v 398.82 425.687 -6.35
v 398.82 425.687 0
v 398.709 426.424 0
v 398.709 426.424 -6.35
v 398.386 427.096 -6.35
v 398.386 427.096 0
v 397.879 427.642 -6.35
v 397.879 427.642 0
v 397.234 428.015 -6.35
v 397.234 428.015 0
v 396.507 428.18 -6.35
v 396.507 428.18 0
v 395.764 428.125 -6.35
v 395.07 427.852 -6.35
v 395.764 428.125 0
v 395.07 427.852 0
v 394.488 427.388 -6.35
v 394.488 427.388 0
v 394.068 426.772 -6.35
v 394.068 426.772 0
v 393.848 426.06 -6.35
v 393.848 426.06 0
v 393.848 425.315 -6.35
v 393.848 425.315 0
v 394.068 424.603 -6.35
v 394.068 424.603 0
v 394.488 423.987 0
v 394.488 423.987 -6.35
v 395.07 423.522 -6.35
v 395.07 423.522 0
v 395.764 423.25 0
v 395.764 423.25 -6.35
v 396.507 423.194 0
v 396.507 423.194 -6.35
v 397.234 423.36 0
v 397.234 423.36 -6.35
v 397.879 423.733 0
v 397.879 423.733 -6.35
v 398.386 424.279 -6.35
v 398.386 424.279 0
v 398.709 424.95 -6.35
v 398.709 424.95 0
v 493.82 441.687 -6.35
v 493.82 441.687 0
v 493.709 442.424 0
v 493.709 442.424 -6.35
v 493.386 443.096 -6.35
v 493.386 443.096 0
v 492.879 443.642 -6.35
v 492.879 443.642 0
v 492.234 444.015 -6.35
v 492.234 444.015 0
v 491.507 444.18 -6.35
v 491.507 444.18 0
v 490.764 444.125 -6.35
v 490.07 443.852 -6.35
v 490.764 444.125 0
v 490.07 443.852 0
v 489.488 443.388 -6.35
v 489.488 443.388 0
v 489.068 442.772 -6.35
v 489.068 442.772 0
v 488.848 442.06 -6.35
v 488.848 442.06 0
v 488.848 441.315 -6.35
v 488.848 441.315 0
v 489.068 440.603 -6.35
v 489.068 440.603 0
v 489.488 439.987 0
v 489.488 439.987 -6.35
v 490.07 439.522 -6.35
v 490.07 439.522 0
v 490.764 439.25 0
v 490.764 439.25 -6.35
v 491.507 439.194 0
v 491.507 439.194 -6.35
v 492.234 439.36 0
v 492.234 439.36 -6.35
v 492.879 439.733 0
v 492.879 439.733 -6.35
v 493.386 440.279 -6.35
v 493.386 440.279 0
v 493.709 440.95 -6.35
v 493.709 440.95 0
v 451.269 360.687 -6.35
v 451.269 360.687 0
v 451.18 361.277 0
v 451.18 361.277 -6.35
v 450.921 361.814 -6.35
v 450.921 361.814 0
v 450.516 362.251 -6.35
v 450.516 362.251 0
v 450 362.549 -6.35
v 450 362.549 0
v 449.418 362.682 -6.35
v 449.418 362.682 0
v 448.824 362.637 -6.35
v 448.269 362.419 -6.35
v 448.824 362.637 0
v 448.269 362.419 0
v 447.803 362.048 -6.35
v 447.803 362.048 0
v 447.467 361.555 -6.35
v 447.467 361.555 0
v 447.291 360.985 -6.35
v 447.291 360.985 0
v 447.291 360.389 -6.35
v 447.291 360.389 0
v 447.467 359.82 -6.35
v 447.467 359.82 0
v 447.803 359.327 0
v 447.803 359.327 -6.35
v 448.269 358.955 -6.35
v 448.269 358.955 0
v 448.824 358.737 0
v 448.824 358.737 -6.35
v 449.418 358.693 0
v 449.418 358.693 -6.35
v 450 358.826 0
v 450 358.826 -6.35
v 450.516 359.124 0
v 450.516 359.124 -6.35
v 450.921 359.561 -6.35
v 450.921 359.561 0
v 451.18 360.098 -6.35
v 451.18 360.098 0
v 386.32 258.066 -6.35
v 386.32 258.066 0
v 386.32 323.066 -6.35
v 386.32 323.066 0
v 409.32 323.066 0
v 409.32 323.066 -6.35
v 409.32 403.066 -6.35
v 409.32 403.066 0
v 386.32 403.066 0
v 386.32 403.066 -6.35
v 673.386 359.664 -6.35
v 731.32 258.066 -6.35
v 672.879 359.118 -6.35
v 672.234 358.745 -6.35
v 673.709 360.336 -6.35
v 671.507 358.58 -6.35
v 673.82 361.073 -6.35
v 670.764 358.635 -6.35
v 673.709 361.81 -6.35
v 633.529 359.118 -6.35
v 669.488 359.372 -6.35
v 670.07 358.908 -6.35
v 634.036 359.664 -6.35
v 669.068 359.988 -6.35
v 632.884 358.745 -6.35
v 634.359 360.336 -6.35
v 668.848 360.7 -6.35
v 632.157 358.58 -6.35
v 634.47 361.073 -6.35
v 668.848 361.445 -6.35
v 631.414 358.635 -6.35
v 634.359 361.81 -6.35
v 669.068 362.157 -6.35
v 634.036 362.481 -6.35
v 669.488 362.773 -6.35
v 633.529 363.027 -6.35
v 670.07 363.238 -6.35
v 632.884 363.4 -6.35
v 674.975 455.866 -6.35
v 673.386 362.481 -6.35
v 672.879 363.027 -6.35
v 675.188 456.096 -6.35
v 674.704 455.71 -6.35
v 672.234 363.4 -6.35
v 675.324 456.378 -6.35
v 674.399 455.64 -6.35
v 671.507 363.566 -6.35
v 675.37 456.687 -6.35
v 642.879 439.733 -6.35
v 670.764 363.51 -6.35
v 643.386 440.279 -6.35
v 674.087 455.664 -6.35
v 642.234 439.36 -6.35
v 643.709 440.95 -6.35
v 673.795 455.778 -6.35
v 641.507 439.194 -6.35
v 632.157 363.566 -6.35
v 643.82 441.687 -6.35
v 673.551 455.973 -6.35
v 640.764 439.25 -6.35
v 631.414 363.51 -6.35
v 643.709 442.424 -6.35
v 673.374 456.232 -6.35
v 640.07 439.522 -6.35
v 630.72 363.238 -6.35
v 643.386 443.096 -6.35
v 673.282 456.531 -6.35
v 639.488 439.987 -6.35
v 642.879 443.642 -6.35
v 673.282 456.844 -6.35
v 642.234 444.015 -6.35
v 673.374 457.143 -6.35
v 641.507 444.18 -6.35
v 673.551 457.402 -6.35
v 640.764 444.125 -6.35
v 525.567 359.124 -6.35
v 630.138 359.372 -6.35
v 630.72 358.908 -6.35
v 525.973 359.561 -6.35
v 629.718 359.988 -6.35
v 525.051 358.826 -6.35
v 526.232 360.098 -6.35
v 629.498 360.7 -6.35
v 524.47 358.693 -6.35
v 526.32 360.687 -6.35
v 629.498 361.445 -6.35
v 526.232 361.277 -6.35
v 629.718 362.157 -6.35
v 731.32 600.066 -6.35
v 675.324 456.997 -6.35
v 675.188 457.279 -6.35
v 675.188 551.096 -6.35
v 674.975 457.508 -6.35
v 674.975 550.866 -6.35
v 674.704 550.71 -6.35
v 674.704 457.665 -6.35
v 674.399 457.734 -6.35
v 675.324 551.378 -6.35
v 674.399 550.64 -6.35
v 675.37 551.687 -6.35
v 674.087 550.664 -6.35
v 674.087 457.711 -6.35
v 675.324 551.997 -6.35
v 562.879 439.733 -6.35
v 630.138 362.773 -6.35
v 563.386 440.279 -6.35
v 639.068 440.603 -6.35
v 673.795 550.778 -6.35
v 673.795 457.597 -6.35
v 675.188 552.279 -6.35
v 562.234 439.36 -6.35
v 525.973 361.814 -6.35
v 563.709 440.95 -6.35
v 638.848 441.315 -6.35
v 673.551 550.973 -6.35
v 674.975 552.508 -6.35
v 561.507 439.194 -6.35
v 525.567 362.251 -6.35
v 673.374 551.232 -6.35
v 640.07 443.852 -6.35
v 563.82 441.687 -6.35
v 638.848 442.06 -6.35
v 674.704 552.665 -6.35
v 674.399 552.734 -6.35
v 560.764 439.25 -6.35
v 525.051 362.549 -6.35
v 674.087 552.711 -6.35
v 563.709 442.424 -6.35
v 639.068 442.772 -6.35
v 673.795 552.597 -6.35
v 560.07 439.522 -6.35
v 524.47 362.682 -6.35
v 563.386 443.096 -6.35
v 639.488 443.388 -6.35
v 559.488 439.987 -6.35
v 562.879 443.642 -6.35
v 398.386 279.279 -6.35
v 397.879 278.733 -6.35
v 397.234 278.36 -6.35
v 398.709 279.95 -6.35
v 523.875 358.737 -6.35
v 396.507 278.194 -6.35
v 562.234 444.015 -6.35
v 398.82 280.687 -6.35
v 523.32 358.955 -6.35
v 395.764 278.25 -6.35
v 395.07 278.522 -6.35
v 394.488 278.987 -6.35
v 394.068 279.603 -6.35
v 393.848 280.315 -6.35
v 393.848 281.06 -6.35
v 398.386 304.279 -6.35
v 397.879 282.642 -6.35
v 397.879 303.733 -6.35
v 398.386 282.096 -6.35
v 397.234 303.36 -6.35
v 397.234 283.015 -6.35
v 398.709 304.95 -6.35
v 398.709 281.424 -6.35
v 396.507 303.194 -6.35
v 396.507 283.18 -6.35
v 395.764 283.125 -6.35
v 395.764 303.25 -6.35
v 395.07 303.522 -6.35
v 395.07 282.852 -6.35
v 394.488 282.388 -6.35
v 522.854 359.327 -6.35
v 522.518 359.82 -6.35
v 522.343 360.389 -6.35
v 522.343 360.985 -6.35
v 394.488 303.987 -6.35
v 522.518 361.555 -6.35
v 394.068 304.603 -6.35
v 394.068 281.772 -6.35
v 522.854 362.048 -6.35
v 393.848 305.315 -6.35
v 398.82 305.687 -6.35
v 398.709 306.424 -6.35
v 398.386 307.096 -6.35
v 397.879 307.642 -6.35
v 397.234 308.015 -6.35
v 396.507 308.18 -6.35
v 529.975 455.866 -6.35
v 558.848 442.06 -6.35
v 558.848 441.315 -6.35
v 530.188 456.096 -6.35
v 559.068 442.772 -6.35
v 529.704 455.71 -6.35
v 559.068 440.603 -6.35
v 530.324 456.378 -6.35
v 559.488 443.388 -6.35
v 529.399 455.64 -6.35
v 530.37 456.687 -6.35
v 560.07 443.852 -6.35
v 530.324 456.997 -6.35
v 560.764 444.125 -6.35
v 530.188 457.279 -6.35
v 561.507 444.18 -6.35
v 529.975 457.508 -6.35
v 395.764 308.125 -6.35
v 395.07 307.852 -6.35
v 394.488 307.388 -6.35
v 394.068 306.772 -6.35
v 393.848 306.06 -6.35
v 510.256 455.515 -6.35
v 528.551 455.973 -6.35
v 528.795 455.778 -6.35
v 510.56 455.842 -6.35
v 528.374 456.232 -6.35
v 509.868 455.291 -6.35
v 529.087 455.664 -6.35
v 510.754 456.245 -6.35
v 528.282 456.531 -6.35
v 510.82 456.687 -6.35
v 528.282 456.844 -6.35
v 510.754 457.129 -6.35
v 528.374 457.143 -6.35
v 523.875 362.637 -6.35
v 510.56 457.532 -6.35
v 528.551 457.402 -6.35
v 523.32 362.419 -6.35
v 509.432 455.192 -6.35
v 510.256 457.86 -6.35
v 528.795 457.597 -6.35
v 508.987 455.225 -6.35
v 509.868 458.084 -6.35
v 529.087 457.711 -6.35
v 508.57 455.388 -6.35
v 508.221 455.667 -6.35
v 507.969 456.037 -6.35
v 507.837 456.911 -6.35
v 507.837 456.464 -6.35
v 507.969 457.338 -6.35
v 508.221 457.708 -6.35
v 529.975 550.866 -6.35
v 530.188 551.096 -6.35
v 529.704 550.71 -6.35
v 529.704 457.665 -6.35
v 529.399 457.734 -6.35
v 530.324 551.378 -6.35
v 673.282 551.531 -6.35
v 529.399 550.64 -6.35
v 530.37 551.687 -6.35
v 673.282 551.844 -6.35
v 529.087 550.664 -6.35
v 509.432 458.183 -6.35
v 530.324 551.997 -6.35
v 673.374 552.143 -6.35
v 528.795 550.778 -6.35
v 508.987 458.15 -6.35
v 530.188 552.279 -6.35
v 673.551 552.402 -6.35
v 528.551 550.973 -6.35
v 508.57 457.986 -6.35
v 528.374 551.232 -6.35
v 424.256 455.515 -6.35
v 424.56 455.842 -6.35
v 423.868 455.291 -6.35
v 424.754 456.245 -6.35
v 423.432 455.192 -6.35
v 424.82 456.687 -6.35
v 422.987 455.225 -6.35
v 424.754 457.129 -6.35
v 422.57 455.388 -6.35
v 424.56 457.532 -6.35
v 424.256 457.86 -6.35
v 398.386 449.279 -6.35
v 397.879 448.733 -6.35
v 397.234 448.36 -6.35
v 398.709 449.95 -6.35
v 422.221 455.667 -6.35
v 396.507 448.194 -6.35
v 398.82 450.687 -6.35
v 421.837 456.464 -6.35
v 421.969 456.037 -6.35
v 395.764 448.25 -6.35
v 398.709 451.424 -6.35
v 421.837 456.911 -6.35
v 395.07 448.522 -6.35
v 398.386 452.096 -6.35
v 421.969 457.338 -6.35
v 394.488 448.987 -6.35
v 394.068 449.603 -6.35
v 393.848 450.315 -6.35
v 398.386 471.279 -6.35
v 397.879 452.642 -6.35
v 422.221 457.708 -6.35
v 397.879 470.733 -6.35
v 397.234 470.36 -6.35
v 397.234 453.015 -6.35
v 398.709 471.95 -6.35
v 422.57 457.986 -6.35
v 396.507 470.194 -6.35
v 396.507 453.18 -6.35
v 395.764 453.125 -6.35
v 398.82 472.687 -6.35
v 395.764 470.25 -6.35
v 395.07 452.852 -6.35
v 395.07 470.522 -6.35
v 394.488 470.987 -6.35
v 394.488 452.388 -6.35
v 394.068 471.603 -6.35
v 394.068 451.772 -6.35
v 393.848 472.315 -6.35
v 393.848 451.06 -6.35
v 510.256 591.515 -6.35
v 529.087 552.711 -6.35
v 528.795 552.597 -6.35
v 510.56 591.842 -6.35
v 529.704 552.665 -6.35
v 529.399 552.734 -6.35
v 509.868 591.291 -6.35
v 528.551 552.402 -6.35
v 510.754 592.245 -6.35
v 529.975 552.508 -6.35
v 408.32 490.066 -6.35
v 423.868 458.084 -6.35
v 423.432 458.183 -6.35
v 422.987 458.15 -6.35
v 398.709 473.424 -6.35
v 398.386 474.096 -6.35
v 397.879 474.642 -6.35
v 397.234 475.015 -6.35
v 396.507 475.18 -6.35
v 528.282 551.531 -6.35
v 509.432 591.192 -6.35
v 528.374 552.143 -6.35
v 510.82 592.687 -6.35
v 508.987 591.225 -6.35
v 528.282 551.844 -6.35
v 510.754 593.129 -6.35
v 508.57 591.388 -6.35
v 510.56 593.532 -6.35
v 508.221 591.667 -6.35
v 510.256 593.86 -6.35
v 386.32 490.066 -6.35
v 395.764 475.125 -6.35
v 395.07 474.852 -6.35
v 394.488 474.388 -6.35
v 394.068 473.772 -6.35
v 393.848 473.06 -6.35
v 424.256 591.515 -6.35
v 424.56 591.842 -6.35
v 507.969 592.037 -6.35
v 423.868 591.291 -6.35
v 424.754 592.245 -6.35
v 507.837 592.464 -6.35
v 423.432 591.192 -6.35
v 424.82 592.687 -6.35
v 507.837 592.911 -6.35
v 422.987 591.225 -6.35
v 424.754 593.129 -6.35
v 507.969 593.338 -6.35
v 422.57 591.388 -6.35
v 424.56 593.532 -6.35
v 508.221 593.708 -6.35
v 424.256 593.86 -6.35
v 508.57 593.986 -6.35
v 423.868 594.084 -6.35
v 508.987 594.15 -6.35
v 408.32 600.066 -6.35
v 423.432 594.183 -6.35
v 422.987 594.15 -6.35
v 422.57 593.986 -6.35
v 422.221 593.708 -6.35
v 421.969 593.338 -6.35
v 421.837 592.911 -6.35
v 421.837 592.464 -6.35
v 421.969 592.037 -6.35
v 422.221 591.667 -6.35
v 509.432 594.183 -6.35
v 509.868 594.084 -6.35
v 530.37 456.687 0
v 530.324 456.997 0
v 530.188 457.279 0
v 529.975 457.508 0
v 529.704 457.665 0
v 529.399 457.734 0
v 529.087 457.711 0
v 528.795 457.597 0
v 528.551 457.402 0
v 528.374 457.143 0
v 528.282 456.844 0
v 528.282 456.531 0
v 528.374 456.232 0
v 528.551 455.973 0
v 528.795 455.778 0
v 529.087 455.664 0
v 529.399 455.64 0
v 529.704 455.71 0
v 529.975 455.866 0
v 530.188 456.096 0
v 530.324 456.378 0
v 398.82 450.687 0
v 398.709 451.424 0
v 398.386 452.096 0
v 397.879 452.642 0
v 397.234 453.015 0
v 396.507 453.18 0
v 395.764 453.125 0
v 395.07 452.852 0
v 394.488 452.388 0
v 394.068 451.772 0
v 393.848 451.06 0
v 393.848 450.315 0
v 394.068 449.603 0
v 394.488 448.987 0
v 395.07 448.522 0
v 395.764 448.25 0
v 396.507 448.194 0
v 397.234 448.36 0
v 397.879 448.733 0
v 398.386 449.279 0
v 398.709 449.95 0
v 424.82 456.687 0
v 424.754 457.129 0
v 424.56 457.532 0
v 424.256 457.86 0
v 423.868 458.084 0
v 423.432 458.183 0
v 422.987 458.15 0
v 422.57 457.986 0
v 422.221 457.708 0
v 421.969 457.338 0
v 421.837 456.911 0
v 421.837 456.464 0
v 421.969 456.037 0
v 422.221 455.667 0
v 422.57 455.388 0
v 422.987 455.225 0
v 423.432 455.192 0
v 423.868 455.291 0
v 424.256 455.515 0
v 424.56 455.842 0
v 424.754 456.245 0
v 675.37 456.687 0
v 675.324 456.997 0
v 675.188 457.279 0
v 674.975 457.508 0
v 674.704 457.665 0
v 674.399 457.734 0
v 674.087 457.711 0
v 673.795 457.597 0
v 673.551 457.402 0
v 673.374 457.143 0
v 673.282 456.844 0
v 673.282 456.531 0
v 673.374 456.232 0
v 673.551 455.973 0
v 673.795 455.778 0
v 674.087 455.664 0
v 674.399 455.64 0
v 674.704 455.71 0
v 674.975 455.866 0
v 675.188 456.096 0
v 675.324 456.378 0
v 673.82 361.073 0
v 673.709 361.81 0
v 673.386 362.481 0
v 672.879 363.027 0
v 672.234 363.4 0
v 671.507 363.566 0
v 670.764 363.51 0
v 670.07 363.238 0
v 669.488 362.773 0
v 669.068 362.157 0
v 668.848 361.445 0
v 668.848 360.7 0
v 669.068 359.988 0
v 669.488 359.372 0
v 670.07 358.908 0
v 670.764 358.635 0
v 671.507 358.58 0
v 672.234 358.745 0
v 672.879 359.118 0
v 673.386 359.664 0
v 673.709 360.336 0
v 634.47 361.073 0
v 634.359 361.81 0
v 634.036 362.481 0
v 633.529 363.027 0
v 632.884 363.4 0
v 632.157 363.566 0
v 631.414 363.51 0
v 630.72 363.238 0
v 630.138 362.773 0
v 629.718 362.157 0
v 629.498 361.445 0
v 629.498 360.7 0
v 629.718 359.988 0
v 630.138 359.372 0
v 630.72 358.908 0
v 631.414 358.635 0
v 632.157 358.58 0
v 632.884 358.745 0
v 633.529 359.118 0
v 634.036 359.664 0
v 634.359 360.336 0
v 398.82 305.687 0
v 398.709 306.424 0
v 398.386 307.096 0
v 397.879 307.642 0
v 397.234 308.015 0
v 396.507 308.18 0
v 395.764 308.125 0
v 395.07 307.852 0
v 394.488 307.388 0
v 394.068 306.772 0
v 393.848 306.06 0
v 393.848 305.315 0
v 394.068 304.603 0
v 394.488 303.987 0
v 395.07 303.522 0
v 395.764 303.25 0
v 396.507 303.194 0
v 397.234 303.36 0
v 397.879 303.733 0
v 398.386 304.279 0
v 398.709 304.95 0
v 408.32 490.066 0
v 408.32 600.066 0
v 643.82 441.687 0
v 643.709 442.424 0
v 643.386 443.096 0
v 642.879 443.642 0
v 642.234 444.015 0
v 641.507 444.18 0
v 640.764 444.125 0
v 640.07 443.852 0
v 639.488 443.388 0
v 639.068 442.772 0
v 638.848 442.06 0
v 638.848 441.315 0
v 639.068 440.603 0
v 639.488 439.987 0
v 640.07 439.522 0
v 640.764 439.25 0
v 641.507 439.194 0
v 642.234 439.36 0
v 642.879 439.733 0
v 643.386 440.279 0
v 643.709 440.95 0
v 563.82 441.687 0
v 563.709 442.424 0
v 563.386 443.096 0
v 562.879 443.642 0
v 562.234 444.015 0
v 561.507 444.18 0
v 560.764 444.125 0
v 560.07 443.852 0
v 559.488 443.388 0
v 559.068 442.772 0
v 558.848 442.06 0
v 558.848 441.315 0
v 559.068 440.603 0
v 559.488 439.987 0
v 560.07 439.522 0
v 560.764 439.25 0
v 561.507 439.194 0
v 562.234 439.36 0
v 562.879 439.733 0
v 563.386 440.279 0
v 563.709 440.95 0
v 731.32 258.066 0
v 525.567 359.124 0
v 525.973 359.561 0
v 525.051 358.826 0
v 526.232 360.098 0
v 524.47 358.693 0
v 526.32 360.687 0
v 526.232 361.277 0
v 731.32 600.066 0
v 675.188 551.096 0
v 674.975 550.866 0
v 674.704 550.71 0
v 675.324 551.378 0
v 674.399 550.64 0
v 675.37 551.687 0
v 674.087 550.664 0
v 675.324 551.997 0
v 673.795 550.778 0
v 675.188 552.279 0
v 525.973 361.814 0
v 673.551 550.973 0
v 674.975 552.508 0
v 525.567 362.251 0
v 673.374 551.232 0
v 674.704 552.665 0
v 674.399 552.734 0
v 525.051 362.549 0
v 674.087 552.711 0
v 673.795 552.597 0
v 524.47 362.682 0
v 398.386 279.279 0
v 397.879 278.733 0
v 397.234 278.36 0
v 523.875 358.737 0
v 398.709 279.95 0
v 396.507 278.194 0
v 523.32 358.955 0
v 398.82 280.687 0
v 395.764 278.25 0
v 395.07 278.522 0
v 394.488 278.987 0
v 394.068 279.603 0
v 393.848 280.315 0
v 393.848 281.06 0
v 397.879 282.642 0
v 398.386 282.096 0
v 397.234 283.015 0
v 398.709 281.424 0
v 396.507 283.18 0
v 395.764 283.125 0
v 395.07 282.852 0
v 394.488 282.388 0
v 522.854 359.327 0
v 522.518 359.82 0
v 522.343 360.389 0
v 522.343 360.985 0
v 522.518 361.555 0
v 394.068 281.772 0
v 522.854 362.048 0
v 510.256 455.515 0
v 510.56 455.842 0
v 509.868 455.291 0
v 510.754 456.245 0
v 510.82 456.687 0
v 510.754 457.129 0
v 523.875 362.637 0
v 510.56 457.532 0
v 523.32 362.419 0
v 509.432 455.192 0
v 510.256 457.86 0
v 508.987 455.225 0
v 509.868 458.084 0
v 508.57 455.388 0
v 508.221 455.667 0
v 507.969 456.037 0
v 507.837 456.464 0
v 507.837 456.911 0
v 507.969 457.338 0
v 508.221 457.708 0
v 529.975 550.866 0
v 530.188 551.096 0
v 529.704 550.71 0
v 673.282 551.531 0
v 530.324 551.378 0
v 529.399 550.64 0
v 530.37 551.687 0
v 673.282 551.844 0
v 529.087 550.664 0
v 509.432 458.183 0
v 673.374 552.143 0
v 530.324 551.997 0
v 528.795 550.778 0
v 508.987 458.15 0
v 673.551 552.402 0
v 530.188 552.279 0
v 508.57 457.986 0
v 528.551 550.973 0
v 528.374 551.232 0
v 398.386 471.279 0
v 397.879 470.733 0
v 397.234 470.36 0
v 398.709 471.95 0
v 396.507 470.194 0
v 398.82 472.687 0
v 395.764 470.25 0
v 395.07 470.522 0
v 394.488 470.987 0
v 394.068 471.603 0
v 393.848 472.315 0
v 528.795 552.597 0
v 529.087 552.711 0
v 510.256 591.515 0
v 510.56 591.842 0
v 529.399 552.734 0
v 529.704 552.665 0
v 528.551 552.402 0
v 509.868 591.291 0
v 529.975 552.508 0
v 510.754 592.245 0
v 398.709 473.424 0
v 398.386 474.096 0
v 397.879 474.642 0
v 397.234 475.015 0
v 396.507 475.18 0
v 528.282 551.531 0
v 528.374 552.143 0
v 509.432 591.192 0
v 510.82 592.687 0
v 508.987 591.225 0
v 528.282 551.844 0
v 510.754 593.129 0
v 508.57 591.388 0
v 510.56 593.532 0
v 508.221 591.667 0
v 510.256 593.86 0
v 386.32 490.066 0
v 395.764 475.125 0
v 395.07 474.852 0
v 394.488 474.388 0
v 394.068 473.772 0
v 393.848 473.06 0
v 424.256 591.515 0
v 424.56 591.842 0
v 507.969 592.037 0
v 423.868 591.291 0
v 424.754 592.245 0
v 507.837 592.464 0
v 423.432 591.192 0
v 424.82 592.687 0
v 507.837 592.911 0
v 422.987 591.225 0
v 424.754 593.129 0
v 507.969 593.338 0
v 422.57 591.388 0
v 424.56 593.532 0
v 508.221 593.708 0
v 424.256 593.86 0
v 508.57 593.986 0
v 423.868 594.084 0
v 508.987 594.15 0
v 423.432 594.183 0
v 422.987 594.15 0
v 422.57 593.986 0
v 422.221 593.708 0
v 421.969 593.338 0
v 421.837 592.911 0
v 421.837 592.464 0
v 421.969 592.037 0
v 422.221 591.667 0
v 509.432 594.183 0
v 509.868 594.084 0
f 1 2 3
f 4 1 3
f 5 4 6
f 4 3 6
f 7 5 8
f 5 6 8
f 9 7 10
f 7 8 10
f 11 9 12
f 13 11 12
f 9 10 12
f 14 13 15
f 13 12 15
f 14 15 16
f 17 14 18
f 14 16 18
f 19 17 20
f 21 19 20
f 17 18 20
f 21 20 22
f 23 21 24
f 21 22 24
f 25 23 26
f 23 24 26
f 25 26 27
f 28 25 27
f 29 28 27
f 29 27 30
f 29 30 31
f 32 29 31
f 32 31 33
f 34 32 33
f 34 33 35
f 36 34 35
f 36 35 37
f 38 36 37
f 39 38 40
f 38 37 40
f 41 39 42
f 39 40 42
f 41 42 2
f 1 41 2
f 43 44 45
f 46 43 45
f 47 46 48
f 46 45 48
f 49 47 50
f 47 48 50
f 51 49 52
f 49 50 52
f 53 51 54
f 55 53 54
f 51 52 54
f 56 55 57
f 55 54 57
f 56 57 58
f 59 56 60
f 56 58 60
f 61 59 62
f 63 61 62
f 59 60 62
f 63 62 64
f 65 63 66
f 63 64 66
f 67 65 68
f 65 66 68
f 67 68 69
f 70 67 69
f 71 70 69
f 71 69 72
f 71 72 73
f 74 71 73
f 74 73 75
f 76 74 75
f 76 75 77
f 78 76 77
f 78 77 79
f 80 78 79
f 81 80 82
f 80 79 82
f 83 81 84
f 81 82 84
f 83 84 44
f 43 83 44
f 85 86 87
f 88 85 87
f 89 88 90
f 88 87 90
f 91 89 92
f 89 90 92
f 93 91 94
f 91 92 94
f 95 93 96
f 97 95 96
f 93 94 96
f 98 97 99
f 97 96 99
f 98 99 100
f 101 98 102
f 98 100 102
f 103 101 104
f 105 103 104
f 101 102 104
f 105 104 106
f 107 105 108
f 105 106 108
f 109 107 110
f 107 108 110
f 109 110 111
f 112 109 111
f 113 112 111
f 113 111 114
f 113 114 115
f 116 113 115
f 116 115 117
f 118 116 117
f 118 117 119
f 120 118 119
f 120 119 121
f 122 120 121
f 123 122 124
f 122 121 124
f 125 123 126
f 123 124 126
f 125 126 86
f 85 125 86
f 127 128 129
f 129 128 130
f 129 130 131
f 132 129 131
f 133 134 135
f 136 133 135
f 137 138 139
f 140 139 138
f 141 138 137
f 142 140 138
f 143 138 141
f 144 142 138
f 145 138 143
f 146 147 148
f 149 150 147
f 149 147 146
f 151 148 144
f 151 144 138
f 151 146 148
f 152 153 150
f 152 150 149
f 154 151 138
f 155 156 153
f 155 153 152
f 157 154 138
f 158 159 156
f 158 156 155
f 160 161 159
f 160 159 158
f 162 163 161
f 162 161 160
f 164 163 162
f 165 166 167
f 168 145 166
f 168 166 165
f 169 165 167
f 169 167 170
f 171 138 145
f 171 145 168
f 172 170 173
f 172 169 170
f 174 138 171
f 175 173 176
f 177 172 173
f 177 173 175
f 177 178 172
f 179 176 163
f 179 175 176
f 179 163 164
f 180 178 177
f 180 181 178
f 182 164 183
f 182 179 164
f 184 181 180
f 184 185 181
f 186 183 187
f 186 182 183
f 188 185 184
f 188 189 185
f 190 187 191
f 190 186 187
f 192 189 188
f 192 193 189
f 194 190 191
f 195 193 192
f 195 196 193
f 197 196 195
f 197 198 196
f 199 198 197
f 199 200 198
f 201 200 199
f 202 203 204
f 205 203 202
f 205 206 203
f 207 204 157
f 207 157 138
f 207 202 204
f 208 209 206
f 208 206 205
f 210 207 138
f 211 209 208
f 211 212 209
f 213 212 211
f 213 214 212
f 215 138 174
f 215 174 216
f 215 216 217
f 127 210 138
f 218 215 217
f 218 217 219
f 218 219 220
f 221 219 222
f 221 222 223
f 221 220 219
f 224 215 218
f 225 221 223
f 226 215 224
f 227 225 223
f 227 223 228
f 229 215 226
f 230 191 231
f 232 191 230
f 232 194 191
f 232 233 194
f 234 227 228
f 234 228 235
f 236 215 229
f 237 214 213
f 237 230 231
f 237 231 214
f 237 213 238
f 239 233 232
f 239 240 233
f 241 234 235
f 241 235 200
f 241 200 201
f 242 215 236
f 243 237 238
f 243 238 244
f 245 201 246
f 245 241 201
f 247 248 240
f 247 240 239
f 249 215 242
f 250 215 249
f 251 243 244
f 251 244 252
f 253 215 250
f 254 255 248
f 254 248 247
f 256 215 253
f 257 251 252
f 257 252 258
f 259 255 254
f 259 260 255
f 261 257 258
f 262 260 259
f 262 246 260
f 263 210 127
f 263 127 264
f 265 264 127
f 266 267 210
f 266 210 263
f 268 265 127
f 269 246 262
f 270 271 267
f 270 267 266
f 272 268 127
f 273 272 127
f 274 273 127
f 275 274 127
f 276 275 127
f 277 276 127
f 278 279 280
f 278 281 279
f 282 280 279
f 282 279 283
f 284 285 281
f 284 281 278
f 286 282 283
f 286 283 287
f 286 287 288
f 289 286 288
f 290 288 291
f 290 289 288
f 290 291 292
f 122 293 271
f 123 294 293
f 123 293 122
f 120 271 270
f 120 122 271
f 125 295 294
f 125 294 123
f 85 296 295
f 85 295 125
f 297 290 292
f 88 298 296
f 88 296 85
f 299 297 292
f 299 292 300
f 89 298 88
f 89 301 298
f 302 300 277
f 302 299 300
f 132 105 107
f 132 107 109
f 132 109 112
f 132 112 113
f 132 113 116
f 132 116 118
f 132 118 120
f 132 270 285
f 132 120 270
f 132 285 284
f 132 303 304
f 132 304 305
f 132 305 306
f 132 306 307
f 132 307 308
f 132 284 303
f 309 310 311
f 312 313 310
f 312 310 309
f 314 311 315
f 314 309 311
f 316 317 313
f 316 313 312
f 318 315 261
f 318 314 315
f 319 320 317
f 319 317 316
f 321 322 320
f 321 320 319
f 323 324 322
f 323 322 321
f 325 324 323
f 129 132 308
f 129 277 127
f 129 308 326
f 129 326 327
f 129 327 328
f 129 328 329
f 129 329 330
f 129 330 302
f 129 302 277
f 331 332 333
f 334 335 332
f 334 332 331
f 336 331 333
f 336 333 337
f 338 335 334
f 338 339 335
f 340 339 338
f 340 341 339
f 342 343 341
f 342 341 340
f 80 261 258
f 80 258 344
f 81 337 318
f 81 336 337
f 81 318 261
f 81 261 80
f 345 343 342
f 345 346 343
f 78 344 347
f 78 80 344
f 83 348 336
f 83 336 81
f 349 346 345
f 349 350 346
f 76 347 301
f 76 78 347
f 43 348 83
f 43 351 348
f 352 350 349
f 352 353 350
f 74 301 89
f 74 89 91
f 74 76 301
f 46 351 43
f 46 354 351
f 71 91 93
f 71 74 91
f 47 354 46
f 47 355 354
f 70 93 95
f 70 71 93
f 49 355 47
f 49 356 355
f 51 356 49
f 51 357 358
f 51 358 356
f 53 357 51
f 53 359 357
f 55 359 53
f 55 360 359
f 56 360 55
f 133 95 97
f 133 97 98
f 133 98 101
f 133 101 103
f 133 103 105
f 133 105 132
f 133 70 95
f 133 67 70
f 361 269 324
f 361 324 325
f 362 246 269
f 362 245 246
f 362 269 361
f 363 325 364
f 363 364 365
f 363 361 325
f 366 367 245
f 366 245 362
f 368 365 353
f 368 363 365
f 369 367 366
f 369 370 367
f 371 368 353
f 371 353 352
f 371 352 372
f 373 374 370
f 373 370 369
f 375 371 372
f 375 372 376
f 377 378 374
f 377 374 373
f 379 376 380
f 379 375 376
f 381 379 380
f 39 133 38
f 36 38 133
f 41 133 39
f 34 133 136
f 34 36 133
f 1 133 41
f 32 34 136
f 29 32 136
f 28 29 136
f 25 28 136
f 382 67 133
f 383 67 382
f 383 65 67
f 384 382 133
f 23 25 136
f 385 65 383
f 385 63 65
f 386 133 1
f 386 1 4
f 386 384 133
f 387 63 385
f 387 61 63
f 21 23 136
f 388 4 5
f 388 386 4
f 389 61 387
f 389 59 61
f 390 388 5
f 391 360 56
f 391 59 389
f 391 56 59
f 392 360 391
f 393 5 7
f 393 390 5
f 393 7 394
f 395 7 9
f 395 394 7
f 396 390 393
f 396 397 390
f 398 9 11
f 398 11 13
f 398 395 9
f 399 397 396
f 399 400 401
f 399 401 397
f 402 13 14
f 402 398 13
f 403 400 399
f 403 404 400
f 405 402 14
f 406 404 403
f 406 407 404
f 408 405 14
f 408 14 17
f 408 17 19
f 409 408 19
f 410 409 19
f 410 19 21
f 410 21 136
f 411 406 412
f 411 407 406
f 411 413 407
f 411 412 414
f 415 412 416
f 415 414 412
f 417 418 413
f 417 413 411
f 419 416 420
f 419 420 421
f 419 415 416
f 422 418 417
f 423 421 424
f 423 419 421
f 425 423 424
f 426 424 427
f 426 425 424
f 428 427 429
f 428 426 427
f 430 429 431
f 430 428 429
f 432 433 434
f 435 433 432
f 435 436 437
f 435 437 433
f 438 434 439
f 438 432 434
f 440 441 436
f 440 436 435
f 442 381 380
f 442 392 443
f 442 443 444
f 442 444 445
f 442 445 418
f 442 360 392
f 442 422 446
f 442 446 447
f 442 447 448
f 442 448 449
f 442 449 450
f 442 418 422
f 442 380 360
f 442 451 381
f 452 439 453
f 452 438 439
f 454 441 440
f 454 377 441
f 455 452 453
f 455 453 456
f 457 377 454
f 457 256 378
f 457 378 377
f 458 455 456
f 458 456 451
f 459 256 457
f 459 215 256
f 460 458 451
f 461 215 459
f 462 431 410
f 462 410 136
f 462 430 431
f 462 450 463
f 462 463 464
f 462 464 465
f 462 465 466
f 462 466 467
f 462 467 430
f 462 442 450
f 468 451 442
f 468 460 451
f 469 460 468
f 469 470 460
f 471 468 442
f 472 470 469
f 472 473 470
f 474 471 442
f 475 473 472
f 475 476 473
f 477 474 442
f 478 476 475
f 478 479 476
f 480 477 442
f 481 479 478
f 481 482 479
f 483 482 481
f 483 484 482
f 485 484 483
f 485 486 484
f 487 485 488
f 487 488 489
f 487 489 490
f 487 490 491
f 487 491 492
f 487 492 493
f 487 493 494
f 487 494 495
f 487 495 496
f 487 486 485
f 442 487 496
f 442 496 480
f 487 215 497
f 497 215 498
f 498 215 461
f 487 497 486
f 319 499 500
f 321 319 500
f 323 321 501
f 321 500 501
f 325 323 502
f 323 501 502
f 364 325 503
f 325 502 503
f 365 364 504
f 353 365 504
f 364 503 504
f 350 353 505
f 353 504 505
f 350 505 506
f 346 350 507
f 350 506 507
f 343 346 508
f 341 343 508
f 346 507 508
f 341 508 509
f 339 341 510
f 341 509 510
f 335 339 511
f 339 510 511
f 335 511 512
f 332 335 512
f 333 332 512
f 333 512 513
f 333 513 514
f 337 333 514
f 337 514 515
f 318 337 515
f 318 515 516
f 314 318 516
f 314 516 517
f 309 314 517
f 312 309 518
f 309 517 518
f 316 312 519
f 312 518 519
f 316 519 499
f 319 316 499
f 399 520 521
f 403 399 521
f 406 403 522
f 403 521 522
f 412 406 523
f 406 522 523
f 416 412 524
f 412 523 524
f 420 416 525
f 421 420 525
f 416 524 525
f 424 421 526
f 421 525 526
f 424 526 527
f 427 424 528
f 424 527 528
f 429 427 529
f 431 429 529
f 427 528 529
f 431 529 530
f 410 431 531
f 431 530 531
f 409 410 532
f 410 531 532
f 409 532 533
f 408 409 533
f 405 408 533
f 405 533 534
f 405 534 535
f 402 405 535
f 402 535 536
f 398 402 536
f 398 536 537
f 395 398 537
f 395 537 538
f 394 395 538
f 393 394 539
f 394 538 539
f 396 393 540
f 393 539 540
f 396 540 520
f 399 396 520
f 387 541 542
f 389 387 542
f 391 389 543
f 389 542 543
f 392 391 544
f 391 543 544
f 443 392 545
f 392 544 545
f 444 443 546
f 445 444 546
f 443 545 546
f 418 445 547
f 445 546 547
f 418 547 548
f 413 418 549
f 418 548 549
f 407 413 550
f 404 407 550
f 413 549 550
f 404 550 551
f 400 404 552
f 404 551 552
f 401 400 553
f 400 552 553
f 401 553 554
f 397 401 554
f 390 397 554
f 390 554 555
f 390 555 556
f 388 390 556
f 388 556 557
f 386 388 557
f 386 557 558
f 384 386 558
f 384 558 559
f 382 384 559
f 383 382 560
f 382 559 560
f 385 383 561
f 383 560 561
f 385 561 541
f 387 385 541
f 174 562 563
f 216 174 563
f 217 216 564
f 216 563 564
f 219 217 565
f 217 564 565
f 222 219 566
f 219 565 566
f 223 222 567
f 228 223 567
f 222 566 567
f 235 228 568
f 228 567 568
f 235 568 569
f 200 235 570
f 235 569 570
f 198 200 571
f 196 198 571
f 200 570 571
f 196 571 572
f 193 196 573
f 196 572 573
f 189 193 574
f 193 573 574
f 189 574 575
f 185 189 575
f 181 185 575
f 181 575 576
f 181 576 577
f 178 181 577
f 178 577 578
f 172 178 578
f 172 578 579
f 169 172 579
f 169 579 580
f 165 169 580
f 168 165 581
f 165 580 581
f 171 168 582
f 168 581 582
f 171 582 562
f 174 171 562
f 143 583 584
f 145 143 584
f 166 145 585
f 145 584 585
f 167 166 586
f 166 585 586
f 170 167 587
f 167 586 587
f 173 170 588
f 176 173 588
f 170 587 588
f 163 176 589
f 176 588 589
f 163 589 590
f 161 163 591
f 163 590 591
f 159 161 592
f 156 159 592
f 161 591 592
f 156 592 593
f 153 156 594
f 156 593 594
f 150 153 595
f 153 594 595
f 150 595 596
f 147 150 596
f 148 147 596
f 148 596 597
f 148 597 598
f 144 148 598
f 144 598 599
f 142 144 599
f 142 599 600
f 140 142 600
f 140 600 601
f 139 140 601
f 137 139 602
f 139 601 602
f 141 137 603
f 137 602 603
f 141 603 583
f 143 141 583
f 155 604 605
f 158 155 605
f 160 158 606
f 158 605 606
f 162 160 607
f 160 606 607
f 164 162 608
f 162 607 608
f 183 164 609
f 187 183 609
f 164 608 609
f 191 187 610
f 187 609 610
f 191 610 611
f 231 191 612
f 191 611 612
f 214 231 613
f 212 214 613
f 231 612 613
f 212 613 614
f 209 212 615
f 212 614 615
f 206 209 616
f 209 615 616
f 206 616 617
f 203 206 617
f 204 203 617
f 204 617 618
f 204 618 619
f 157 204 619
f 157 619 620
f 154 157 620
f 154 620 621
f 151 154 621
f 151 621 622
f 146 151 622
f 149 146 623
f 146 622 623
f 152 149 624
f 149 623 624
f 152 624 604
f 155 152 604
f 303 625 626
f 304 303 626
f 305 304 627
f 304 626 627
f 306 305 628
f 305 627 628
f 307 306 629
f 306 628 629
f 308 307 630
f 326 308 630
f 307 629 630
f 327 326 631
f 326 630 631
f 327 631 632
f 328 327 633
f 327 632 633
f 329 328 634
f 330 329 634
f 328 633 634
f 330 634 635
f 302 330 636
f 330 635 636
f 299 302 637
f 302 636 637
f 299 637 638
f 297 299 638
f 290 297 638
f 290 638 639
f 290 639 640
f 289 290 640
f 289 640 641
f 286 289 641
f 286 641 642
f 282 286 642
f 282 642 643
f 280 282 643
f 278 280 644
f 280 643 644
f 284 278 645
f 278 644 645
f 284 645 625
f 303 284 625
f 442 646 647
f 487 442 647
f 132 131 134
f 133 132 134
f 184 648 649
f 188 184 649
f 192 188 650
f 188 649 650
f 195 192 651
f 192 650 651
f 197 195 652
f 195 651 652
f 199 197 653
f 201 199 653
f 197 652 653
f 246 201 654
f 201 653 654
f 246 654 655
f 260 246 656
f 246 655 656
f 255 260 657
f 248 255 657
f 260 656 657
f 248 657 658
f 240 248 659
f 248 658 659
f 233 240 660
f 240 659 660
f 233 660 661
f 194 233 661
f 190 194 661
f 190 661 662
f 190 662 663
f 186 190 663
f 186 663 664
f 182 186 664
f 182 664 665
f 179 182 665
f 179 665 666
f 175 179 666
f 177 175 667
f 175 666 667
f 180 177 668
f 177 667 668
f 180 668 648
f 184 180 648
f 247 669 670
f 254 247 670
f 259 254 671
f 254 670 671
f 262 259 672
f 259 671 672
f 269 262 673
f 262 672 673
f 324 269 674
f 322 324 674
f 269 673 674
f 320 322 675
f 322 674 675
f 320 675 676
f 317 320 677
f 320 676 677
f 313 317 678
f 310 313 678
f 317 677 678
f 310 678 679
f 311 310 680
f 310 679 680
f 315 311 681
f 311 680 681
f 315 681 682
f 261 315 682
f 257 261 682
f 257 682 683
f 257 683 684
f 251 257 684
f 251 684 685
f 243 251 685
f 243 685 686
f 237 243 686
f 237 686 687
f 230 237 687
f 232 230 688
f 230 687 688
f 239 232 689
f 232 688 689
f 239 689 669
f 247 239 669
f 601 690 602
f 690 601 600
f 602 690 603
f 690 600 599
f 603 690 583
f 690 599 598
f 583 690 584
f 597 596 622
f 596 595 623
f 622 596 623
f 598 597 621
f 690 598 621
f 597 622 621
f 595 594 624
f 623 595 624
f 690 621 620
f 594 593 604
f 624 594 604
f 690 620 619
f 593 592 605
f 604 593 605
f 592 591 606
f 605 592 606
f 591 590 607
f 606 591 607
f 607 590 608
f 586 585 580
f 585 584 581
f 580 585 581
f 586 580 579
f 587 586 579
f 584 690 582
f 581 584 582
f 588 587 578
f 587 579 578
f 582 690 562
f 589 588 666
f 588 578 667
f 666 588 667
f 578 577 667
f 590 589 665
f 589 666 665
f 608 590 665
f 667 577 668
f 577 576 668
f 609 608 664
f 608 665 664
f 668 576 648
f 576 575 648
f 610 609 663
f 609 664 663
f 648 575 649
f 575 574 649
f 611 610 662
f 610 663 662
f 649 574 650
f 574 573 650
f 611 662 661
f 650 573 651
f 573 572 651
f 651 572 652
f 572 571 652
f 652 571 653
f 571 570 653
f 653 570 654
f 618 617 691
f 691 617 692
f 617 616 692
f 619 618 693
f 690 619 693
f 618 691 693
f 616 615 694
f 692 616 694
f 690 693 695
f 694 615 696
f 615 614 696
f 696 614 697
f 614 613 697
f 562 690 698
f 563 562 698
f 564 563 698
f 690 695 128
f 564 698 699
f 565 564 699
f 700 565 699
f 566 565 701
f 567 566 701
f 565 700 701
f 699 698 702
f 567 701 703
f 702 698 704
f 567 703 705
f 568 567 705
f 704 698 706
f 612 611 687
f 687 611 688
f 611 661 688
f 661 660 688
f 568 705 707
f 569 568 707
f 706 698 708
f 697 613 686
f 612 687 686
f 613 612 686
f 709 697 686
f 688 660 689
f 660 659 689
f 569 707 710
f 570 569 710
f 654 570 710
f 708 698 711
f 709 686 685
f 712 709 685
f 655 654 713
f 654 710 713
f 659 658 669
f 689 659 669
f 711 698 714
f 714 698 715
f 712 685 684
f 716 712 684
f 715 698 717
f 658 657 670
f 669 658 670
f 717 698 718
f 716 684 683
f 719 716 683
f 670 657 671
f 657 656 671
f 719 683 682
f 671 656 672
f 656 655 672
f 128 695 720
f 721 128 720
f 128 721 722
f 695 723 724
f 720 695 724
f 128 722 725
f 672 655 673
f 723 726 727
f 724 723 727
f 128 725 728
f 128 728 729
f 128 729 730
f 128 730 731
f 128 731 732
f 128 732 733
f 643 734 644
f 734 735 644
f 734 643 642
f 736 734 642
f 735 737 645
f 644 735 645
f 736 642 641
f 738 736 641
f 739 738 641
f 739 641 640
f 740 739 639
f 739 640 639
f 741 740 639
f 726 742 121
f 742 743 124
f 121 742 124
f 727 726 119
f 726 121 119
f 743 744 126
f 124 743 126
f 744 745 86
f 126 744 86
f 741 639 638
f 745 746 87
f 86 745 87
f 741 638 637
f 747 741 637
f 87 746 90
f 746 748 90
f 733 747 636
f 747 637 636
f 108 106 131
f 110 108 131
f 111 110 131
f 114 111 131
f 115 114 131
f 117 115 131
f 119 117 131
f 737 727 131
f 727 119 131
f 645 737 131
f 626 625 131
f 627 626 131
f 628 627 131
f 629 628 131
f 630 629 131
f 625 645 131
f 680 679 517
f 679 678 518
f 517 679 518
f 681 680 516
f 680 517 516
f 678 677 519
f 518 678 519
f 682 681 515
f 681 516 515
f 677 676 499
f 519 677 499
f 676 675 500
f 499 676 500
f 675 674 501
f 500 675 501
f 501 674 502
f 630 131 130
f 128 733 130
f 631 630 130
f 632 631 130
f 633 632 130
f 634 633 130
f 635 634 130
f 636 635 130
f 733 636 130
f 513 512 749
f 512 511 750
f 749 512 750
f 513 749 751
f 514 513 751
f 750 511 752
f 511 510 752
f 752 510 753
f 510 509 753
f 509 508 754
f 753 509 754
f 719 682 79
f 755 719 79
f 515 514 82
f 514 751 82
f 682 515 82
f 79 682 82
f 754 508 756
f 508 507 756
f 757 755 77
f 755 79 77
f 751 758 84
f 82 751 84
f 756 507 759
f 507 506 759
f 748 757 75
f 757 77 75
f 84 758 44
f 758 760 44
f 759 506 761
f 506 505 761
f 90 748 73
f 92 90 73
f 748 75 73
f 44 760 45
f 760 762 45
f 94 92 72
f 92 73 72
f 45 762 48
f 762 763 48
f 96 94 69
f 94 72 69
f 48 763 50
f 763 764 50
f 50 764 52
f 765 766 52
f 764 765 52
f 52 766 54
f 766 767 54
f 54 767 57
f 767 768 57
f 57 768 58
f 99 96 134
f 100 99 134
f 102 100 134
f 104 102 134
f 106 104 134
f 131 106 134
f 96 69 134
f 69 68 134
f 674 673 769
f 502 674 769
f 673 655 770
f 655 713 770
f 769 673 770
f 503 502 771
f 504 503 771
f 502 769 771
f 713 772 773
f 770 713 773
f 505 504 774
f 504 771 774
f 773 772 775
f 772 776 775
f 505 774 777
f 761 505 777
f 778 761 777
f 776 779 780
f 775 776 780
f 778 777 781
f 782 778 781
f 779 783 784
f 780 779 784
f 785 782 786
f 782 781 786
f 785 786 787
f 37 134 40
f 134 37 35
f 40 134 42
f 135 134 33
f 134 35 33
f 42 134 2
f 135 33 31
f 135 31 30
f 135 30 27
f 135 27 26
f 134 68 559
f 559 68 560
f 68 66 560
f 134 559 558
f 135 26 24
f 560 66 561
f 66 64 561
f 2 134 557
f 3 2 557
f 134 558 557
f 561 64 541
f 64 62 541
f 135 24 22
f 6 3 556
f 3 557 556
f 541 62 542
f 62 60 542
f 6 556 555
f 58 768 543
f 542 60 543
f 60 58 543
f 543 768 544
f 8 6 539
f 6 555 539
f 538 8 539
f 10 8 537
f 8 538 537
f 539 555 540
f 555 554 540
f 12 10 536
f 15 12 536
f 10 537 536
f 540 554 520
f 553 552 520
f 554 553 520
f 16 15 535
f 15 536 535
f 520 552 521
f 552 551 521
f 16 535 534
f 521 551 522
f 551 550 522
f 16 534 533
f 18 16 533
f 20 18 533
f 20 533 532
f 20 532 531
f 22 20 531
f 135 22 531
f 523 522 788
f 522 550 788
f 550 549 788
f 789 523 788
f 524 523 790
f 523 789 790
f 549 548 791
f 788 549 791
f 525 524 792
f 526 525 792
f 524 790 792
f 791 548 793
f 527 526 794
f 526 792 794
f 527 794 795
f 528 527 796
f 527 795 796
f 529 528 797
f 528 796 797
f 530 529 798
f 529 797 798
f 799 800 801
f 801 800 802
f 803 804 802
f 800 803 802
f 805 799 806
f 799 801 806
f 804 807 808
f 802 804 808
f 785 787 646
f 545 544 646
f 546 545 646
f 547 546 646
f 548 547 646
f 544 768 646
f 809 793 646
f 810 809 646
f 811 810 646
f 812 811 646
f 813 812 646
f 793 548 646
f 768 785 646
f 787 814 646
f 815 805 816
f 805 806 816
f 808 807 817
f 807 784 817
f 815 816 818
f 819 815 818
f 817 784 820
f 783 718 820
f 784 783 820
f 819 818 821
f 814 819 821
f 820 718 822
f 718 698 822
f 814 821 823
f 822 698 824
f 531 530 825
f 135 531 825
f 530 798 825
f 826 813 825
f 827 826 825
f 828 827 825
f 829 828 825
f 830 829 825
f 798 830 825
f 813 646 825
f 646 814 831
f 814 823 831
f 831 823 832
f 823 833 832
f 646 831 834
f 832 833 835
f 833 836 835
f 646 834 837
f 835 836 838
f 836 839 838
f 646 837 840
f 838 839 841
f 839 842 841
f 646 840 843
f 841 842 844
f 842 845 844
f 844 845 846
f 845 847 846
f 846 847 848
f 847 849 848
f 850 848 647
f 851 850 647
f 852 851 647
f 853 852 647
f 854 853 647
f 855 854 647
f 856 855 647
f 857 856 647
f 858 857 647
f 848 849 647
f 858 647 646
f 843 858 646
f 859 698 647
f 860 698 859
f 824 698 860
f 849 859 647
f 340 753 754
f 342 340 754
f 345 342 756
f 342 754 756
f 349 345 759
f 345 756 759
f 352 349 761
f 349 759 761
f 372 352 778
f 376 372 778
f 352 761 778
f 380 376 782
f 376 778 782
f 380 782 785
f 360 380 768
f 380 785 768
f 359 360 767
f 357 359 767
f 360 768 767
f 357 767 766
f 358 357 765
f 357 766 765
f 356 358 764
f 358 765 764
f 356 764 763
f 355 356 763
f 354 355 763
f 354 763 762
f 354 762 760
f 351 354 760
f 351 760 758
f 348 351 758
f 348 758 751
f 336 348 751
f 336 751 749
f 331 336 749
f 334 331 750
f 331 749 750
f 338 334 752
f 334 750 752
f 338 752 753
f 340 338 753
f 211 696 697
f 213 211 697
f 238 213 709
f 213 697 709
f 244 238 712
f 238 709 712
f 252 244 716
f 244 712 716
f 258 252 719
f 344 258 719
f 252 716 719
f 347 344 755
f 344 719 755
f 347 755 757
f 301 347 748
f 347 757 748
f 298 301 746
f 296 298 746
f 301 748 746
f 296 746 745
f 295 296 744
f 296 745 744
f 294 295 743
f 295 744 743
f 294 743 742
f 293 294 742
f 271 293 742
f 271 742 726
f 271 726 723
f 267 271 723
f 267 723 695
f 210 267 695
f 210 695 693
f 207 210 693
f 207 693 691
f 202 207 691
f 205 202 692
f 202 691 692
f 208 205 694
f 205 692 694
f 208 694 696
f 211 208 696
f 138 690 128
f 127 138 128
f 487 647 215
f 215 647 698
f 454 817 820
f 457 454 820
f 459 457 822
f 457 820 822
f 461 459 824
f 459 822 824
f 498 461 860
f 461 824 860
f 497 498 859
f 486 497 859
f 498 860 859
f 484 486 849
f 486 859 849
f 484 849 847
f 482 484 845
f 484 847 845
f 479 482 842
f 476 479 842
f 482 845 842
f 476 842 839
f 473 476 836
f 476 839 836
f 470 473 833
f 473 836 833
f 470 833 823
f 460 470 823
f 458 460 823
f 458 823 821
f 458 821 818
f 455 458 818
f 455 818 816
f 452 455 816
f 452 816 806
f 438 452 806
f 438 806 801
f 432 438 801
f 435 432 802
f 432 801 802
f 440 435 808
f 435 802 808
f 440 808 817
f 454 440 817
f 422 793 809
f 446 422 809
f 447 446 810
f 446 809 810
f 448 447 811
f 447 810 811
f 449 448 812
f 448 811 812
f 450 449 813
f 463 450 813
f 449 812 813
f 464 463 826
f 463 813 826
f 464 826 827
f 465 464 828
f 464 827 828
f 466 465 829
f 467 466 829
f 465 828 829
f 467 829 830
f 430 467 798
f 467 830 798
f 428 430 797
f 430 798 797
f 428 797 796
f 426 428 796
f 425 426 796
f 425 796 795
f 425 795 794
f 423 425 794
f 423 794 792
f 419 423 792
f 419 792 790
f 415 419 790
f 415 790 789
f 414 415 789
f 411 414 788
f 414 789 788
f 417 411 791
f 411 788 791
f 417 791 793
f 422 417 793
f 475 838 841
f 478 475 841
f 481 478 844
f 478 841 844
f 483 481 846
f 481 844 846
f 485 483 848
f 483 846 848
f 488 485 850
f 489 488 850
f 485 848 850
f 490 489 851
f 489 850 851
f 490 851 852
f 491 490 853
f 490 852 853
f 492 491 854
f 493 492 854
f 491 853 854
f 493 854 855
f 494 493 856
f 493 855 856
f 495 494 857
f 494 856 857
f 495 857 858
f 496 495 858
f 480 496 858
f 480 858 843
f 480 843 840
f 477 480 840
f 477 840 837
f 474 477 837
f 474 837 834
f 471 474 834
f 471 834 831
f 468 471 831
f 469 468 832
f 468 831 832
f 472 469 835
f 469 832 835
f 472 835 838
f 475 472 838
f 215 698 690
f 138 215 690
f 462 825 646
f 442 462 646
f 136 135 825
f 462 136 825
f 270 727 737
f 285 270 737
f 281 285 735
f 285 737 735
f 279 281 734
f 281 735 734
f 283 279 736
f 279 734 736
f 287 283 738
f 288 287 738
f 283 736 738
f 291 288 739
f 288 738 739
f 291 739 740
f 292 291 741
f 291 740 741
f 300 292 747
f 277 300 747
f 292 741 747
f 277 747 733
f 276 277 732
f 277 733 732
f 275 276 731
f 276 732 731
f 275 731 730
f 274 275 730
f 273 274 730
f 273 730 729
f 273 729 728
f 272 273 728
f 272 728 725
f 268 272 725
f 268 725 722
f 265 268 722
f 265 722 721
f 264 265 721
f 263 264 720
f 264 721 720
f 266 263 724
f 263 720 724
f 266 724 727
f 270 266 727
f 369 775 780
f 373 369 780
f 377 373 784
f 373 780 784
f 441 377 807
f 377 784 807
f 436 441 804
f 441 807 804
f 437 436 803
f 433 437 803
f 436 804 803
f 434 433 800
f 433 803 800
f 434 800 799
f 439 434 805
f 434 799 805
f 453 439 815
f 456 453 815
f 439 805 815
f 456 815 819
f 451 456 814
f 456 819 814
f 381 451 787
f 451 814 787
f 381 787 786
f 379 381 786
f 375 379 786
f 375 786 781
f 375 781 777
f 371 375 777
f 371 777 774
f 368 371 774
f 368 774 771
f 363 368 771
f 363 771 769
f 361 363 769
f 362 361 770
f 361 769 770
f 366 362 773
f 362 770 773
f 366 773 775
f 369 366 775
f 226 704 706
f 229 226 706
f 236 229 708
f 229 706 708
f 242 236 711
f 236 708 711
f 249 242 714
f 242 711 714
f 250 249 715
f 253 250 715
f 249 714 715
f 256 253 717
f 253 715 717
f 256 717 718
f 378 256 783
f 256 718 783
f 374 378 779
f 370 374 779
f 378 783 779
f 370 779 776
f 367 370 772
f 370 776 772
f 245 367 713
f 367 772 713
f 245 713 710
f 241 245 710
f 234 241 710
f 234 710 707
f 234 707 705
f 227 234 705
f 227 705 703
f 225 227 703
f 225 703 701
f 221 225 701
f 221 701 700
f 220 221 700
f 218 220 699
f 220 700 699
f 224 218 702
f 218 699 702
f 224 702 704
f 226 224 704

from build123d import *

# Parameters (mm, degrees)
MODEL_R             = 2.5
MODEL_R_2           = 2
MODEL_R_3           = 1.5
MODEL_R_4           = 1.05
BOSS_EXTRUDE1_DEPTH = 6.35


with BuildPart() as part:
    # Model → Boss-Extrude1 (new body)
    with BuildSketch(Plane.XY):
        Polygon((731.320358487, 258.065863271), (386.320358487, 258.065863271), (386.320358487, 323.065863271), (409.320358487, 323.065863271), (409.320358487, 403.065863271), (386.320358487, 403.065863271), (386.320358487, 490.065863271), (408.320358487, 490.065863271), (408.320358487, 600.065863271), (731.320358487, 600.065863271), align=None)
        with Locations((396.320358487, 472.687351768)):
            Circle(MODEL_R, mode=Mode.SUBTRACT)
        with Locations((396.320358487, 450.687351768)):
            Circle(MODEL_R, mode=Mode.SUBTRACT)
        with Locations((396.320358487, 425.687351768)):
            Circle(MODEL_R, mode=Mode.SUBTRACT)
        with Locations((396.320358487, 305.687351768)):
            Circle(MODEL_R, mode=Mode.SUBTRACT)
        with Locations((396.320358487, 280.687351768)):
            Circle(MODEL_R, mode=Mode.SUBTRACT)
        with Locations((491.320358487, 441.687351768)):
            Circle(MODEL_R, mode=Mode.SUBTRACT)
        with Locations((561.320358487, 441.687351768)):
            Circle(MODEL_R, mode=Mode.SUBTRACT)
        with Locations((641.320358487, 441.687351768)):
            Circle(MODEL_R, mode=Mode.SUBTRACT)
        with Locations((449.26902181, 360.687351768)):
            Circle(MODEL_R_2, mode=Mode.SUBTRACT)
        with Locations((524.320358487, 360.687351768)):
            Circle(MODEL_R_2, mode=Mode.SUBTRACT)
        with Locations((423.320358487, 592.687351768)):
            Circle(MODEL_R_3, mode=Mode.SUBTRACT)
        with Locations((509.320358487, 592.687351768)):
            Circle(MODEL_R_3, mode=Mode.SUBTRACT)
        with Locations((509.320358487, 456.687351768)):
            Circle(MODEL_R_3, mode=Mode.SUBTRACT)
        with Locations((423.320358487, 456.687351768)):
            Circle(MODEL_R_3, mode=Mode.SUBTRACT)
        with Locations((529.320358487, 551.687351768)):
            Circle(MODEL_R_4, mode=Mode.SUBTRACT)
        with Locations((674.320358487, 551.687351768)):
            Circle(MODEL_R_4, mode=Mode.SUBTRACT)
        with Locations((529.320358487, 456.687351768)):
            Circle(MODEL_R_4, mode=Mode.SUBTRACT)
        with Locations((674.320358487, 456.687351768)):
            Circle(MODEL_R_4, mode=Mode.SUBTRACT)
        with Locations((631.970358487, 361.072616848)):
            Circle(MODEL_R, mode=Mode.SUBTRACT)
        with Locations((671.320358487, 361.072616848)):
            Circle(MODEL_R, mode=Mode.SUBTRACT)
    extrude(amount=-BOSS_EXTRUDE1_DEPTH)


solid = part.part
